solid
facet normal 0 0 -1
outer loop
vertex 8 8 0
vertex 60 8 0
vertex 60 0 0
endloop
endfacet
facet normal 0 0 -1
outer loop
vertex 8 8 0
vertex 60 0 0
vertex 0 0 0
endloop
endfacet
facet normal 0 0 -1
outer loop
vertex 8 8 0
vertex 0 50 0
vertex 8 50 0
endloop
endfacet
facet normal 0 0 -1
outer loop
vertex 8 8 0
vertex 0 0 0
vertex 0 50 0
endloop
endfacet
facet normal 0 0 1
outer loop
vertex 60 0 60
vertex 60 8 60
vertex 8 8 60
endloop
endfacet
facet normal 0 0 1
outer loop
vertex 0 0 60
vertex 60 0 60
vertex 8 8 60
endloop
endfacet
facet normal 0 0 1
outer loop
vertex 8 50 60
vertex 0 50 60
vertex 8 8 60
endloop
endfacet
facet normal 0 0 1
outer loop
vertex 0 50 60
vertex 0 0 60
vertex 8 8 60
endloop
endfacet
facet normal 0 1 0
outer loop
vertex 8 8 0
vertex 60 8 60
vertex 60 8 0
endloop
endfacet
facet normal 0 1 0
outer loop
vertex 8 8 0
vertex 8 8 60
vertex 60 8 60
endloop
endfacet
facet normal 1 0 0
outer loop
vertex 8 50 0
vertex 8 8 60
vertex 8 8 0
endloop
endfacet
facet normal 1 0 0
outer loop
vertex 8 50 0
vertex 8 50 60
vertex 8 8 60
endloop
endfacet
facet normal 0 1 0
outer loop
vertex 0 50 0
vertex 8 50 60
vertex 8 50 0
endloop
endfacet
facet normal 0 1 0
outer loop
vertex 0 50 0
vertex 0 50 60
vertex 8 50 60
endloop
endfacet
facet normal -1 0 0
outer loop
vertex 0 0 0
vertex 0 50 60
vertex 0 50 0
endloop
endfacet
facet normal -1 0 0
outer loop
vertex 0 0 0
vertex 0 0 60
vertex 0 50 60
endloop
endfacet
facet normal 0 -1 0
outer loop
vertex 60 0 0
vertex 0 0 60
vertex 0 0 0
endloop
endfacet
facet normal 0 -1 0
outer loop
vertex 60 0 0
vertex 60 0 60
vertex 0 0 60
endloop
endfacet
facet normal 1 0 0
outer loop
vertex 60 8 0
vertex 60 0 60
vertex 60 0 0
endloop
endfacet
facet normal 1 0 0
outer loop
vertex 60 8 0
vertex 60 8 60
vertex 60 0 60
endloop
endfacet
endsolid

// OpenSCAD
$fn = 32;

// ----------------------------------------------------------------------
// Structural section: angle 60 x 50 mm
// ----------------------------------------------------------------------

// --- parameters (mm) ---
sec_w = 60;               // leg width, X
sec_h = 50;               // leg height, Y
flange_t = 8;             // leg thickness
plate_t = 60;             // cut length, Z (extrusion height)
fit_tol = 0.1;            // declared fit tolerance (prompt contract)
free_tol = 0.3;           // declared free tolerance (prompt contract)

profile = [[0, 0], [60, 0], [60, 8], [8, 8], [8, 50], [0, 50]];  // primary outline, 6 points, counter clockwise

// --- the one profile operation ---
linear_extrude(height = plate_t) polygon(points = profile);
